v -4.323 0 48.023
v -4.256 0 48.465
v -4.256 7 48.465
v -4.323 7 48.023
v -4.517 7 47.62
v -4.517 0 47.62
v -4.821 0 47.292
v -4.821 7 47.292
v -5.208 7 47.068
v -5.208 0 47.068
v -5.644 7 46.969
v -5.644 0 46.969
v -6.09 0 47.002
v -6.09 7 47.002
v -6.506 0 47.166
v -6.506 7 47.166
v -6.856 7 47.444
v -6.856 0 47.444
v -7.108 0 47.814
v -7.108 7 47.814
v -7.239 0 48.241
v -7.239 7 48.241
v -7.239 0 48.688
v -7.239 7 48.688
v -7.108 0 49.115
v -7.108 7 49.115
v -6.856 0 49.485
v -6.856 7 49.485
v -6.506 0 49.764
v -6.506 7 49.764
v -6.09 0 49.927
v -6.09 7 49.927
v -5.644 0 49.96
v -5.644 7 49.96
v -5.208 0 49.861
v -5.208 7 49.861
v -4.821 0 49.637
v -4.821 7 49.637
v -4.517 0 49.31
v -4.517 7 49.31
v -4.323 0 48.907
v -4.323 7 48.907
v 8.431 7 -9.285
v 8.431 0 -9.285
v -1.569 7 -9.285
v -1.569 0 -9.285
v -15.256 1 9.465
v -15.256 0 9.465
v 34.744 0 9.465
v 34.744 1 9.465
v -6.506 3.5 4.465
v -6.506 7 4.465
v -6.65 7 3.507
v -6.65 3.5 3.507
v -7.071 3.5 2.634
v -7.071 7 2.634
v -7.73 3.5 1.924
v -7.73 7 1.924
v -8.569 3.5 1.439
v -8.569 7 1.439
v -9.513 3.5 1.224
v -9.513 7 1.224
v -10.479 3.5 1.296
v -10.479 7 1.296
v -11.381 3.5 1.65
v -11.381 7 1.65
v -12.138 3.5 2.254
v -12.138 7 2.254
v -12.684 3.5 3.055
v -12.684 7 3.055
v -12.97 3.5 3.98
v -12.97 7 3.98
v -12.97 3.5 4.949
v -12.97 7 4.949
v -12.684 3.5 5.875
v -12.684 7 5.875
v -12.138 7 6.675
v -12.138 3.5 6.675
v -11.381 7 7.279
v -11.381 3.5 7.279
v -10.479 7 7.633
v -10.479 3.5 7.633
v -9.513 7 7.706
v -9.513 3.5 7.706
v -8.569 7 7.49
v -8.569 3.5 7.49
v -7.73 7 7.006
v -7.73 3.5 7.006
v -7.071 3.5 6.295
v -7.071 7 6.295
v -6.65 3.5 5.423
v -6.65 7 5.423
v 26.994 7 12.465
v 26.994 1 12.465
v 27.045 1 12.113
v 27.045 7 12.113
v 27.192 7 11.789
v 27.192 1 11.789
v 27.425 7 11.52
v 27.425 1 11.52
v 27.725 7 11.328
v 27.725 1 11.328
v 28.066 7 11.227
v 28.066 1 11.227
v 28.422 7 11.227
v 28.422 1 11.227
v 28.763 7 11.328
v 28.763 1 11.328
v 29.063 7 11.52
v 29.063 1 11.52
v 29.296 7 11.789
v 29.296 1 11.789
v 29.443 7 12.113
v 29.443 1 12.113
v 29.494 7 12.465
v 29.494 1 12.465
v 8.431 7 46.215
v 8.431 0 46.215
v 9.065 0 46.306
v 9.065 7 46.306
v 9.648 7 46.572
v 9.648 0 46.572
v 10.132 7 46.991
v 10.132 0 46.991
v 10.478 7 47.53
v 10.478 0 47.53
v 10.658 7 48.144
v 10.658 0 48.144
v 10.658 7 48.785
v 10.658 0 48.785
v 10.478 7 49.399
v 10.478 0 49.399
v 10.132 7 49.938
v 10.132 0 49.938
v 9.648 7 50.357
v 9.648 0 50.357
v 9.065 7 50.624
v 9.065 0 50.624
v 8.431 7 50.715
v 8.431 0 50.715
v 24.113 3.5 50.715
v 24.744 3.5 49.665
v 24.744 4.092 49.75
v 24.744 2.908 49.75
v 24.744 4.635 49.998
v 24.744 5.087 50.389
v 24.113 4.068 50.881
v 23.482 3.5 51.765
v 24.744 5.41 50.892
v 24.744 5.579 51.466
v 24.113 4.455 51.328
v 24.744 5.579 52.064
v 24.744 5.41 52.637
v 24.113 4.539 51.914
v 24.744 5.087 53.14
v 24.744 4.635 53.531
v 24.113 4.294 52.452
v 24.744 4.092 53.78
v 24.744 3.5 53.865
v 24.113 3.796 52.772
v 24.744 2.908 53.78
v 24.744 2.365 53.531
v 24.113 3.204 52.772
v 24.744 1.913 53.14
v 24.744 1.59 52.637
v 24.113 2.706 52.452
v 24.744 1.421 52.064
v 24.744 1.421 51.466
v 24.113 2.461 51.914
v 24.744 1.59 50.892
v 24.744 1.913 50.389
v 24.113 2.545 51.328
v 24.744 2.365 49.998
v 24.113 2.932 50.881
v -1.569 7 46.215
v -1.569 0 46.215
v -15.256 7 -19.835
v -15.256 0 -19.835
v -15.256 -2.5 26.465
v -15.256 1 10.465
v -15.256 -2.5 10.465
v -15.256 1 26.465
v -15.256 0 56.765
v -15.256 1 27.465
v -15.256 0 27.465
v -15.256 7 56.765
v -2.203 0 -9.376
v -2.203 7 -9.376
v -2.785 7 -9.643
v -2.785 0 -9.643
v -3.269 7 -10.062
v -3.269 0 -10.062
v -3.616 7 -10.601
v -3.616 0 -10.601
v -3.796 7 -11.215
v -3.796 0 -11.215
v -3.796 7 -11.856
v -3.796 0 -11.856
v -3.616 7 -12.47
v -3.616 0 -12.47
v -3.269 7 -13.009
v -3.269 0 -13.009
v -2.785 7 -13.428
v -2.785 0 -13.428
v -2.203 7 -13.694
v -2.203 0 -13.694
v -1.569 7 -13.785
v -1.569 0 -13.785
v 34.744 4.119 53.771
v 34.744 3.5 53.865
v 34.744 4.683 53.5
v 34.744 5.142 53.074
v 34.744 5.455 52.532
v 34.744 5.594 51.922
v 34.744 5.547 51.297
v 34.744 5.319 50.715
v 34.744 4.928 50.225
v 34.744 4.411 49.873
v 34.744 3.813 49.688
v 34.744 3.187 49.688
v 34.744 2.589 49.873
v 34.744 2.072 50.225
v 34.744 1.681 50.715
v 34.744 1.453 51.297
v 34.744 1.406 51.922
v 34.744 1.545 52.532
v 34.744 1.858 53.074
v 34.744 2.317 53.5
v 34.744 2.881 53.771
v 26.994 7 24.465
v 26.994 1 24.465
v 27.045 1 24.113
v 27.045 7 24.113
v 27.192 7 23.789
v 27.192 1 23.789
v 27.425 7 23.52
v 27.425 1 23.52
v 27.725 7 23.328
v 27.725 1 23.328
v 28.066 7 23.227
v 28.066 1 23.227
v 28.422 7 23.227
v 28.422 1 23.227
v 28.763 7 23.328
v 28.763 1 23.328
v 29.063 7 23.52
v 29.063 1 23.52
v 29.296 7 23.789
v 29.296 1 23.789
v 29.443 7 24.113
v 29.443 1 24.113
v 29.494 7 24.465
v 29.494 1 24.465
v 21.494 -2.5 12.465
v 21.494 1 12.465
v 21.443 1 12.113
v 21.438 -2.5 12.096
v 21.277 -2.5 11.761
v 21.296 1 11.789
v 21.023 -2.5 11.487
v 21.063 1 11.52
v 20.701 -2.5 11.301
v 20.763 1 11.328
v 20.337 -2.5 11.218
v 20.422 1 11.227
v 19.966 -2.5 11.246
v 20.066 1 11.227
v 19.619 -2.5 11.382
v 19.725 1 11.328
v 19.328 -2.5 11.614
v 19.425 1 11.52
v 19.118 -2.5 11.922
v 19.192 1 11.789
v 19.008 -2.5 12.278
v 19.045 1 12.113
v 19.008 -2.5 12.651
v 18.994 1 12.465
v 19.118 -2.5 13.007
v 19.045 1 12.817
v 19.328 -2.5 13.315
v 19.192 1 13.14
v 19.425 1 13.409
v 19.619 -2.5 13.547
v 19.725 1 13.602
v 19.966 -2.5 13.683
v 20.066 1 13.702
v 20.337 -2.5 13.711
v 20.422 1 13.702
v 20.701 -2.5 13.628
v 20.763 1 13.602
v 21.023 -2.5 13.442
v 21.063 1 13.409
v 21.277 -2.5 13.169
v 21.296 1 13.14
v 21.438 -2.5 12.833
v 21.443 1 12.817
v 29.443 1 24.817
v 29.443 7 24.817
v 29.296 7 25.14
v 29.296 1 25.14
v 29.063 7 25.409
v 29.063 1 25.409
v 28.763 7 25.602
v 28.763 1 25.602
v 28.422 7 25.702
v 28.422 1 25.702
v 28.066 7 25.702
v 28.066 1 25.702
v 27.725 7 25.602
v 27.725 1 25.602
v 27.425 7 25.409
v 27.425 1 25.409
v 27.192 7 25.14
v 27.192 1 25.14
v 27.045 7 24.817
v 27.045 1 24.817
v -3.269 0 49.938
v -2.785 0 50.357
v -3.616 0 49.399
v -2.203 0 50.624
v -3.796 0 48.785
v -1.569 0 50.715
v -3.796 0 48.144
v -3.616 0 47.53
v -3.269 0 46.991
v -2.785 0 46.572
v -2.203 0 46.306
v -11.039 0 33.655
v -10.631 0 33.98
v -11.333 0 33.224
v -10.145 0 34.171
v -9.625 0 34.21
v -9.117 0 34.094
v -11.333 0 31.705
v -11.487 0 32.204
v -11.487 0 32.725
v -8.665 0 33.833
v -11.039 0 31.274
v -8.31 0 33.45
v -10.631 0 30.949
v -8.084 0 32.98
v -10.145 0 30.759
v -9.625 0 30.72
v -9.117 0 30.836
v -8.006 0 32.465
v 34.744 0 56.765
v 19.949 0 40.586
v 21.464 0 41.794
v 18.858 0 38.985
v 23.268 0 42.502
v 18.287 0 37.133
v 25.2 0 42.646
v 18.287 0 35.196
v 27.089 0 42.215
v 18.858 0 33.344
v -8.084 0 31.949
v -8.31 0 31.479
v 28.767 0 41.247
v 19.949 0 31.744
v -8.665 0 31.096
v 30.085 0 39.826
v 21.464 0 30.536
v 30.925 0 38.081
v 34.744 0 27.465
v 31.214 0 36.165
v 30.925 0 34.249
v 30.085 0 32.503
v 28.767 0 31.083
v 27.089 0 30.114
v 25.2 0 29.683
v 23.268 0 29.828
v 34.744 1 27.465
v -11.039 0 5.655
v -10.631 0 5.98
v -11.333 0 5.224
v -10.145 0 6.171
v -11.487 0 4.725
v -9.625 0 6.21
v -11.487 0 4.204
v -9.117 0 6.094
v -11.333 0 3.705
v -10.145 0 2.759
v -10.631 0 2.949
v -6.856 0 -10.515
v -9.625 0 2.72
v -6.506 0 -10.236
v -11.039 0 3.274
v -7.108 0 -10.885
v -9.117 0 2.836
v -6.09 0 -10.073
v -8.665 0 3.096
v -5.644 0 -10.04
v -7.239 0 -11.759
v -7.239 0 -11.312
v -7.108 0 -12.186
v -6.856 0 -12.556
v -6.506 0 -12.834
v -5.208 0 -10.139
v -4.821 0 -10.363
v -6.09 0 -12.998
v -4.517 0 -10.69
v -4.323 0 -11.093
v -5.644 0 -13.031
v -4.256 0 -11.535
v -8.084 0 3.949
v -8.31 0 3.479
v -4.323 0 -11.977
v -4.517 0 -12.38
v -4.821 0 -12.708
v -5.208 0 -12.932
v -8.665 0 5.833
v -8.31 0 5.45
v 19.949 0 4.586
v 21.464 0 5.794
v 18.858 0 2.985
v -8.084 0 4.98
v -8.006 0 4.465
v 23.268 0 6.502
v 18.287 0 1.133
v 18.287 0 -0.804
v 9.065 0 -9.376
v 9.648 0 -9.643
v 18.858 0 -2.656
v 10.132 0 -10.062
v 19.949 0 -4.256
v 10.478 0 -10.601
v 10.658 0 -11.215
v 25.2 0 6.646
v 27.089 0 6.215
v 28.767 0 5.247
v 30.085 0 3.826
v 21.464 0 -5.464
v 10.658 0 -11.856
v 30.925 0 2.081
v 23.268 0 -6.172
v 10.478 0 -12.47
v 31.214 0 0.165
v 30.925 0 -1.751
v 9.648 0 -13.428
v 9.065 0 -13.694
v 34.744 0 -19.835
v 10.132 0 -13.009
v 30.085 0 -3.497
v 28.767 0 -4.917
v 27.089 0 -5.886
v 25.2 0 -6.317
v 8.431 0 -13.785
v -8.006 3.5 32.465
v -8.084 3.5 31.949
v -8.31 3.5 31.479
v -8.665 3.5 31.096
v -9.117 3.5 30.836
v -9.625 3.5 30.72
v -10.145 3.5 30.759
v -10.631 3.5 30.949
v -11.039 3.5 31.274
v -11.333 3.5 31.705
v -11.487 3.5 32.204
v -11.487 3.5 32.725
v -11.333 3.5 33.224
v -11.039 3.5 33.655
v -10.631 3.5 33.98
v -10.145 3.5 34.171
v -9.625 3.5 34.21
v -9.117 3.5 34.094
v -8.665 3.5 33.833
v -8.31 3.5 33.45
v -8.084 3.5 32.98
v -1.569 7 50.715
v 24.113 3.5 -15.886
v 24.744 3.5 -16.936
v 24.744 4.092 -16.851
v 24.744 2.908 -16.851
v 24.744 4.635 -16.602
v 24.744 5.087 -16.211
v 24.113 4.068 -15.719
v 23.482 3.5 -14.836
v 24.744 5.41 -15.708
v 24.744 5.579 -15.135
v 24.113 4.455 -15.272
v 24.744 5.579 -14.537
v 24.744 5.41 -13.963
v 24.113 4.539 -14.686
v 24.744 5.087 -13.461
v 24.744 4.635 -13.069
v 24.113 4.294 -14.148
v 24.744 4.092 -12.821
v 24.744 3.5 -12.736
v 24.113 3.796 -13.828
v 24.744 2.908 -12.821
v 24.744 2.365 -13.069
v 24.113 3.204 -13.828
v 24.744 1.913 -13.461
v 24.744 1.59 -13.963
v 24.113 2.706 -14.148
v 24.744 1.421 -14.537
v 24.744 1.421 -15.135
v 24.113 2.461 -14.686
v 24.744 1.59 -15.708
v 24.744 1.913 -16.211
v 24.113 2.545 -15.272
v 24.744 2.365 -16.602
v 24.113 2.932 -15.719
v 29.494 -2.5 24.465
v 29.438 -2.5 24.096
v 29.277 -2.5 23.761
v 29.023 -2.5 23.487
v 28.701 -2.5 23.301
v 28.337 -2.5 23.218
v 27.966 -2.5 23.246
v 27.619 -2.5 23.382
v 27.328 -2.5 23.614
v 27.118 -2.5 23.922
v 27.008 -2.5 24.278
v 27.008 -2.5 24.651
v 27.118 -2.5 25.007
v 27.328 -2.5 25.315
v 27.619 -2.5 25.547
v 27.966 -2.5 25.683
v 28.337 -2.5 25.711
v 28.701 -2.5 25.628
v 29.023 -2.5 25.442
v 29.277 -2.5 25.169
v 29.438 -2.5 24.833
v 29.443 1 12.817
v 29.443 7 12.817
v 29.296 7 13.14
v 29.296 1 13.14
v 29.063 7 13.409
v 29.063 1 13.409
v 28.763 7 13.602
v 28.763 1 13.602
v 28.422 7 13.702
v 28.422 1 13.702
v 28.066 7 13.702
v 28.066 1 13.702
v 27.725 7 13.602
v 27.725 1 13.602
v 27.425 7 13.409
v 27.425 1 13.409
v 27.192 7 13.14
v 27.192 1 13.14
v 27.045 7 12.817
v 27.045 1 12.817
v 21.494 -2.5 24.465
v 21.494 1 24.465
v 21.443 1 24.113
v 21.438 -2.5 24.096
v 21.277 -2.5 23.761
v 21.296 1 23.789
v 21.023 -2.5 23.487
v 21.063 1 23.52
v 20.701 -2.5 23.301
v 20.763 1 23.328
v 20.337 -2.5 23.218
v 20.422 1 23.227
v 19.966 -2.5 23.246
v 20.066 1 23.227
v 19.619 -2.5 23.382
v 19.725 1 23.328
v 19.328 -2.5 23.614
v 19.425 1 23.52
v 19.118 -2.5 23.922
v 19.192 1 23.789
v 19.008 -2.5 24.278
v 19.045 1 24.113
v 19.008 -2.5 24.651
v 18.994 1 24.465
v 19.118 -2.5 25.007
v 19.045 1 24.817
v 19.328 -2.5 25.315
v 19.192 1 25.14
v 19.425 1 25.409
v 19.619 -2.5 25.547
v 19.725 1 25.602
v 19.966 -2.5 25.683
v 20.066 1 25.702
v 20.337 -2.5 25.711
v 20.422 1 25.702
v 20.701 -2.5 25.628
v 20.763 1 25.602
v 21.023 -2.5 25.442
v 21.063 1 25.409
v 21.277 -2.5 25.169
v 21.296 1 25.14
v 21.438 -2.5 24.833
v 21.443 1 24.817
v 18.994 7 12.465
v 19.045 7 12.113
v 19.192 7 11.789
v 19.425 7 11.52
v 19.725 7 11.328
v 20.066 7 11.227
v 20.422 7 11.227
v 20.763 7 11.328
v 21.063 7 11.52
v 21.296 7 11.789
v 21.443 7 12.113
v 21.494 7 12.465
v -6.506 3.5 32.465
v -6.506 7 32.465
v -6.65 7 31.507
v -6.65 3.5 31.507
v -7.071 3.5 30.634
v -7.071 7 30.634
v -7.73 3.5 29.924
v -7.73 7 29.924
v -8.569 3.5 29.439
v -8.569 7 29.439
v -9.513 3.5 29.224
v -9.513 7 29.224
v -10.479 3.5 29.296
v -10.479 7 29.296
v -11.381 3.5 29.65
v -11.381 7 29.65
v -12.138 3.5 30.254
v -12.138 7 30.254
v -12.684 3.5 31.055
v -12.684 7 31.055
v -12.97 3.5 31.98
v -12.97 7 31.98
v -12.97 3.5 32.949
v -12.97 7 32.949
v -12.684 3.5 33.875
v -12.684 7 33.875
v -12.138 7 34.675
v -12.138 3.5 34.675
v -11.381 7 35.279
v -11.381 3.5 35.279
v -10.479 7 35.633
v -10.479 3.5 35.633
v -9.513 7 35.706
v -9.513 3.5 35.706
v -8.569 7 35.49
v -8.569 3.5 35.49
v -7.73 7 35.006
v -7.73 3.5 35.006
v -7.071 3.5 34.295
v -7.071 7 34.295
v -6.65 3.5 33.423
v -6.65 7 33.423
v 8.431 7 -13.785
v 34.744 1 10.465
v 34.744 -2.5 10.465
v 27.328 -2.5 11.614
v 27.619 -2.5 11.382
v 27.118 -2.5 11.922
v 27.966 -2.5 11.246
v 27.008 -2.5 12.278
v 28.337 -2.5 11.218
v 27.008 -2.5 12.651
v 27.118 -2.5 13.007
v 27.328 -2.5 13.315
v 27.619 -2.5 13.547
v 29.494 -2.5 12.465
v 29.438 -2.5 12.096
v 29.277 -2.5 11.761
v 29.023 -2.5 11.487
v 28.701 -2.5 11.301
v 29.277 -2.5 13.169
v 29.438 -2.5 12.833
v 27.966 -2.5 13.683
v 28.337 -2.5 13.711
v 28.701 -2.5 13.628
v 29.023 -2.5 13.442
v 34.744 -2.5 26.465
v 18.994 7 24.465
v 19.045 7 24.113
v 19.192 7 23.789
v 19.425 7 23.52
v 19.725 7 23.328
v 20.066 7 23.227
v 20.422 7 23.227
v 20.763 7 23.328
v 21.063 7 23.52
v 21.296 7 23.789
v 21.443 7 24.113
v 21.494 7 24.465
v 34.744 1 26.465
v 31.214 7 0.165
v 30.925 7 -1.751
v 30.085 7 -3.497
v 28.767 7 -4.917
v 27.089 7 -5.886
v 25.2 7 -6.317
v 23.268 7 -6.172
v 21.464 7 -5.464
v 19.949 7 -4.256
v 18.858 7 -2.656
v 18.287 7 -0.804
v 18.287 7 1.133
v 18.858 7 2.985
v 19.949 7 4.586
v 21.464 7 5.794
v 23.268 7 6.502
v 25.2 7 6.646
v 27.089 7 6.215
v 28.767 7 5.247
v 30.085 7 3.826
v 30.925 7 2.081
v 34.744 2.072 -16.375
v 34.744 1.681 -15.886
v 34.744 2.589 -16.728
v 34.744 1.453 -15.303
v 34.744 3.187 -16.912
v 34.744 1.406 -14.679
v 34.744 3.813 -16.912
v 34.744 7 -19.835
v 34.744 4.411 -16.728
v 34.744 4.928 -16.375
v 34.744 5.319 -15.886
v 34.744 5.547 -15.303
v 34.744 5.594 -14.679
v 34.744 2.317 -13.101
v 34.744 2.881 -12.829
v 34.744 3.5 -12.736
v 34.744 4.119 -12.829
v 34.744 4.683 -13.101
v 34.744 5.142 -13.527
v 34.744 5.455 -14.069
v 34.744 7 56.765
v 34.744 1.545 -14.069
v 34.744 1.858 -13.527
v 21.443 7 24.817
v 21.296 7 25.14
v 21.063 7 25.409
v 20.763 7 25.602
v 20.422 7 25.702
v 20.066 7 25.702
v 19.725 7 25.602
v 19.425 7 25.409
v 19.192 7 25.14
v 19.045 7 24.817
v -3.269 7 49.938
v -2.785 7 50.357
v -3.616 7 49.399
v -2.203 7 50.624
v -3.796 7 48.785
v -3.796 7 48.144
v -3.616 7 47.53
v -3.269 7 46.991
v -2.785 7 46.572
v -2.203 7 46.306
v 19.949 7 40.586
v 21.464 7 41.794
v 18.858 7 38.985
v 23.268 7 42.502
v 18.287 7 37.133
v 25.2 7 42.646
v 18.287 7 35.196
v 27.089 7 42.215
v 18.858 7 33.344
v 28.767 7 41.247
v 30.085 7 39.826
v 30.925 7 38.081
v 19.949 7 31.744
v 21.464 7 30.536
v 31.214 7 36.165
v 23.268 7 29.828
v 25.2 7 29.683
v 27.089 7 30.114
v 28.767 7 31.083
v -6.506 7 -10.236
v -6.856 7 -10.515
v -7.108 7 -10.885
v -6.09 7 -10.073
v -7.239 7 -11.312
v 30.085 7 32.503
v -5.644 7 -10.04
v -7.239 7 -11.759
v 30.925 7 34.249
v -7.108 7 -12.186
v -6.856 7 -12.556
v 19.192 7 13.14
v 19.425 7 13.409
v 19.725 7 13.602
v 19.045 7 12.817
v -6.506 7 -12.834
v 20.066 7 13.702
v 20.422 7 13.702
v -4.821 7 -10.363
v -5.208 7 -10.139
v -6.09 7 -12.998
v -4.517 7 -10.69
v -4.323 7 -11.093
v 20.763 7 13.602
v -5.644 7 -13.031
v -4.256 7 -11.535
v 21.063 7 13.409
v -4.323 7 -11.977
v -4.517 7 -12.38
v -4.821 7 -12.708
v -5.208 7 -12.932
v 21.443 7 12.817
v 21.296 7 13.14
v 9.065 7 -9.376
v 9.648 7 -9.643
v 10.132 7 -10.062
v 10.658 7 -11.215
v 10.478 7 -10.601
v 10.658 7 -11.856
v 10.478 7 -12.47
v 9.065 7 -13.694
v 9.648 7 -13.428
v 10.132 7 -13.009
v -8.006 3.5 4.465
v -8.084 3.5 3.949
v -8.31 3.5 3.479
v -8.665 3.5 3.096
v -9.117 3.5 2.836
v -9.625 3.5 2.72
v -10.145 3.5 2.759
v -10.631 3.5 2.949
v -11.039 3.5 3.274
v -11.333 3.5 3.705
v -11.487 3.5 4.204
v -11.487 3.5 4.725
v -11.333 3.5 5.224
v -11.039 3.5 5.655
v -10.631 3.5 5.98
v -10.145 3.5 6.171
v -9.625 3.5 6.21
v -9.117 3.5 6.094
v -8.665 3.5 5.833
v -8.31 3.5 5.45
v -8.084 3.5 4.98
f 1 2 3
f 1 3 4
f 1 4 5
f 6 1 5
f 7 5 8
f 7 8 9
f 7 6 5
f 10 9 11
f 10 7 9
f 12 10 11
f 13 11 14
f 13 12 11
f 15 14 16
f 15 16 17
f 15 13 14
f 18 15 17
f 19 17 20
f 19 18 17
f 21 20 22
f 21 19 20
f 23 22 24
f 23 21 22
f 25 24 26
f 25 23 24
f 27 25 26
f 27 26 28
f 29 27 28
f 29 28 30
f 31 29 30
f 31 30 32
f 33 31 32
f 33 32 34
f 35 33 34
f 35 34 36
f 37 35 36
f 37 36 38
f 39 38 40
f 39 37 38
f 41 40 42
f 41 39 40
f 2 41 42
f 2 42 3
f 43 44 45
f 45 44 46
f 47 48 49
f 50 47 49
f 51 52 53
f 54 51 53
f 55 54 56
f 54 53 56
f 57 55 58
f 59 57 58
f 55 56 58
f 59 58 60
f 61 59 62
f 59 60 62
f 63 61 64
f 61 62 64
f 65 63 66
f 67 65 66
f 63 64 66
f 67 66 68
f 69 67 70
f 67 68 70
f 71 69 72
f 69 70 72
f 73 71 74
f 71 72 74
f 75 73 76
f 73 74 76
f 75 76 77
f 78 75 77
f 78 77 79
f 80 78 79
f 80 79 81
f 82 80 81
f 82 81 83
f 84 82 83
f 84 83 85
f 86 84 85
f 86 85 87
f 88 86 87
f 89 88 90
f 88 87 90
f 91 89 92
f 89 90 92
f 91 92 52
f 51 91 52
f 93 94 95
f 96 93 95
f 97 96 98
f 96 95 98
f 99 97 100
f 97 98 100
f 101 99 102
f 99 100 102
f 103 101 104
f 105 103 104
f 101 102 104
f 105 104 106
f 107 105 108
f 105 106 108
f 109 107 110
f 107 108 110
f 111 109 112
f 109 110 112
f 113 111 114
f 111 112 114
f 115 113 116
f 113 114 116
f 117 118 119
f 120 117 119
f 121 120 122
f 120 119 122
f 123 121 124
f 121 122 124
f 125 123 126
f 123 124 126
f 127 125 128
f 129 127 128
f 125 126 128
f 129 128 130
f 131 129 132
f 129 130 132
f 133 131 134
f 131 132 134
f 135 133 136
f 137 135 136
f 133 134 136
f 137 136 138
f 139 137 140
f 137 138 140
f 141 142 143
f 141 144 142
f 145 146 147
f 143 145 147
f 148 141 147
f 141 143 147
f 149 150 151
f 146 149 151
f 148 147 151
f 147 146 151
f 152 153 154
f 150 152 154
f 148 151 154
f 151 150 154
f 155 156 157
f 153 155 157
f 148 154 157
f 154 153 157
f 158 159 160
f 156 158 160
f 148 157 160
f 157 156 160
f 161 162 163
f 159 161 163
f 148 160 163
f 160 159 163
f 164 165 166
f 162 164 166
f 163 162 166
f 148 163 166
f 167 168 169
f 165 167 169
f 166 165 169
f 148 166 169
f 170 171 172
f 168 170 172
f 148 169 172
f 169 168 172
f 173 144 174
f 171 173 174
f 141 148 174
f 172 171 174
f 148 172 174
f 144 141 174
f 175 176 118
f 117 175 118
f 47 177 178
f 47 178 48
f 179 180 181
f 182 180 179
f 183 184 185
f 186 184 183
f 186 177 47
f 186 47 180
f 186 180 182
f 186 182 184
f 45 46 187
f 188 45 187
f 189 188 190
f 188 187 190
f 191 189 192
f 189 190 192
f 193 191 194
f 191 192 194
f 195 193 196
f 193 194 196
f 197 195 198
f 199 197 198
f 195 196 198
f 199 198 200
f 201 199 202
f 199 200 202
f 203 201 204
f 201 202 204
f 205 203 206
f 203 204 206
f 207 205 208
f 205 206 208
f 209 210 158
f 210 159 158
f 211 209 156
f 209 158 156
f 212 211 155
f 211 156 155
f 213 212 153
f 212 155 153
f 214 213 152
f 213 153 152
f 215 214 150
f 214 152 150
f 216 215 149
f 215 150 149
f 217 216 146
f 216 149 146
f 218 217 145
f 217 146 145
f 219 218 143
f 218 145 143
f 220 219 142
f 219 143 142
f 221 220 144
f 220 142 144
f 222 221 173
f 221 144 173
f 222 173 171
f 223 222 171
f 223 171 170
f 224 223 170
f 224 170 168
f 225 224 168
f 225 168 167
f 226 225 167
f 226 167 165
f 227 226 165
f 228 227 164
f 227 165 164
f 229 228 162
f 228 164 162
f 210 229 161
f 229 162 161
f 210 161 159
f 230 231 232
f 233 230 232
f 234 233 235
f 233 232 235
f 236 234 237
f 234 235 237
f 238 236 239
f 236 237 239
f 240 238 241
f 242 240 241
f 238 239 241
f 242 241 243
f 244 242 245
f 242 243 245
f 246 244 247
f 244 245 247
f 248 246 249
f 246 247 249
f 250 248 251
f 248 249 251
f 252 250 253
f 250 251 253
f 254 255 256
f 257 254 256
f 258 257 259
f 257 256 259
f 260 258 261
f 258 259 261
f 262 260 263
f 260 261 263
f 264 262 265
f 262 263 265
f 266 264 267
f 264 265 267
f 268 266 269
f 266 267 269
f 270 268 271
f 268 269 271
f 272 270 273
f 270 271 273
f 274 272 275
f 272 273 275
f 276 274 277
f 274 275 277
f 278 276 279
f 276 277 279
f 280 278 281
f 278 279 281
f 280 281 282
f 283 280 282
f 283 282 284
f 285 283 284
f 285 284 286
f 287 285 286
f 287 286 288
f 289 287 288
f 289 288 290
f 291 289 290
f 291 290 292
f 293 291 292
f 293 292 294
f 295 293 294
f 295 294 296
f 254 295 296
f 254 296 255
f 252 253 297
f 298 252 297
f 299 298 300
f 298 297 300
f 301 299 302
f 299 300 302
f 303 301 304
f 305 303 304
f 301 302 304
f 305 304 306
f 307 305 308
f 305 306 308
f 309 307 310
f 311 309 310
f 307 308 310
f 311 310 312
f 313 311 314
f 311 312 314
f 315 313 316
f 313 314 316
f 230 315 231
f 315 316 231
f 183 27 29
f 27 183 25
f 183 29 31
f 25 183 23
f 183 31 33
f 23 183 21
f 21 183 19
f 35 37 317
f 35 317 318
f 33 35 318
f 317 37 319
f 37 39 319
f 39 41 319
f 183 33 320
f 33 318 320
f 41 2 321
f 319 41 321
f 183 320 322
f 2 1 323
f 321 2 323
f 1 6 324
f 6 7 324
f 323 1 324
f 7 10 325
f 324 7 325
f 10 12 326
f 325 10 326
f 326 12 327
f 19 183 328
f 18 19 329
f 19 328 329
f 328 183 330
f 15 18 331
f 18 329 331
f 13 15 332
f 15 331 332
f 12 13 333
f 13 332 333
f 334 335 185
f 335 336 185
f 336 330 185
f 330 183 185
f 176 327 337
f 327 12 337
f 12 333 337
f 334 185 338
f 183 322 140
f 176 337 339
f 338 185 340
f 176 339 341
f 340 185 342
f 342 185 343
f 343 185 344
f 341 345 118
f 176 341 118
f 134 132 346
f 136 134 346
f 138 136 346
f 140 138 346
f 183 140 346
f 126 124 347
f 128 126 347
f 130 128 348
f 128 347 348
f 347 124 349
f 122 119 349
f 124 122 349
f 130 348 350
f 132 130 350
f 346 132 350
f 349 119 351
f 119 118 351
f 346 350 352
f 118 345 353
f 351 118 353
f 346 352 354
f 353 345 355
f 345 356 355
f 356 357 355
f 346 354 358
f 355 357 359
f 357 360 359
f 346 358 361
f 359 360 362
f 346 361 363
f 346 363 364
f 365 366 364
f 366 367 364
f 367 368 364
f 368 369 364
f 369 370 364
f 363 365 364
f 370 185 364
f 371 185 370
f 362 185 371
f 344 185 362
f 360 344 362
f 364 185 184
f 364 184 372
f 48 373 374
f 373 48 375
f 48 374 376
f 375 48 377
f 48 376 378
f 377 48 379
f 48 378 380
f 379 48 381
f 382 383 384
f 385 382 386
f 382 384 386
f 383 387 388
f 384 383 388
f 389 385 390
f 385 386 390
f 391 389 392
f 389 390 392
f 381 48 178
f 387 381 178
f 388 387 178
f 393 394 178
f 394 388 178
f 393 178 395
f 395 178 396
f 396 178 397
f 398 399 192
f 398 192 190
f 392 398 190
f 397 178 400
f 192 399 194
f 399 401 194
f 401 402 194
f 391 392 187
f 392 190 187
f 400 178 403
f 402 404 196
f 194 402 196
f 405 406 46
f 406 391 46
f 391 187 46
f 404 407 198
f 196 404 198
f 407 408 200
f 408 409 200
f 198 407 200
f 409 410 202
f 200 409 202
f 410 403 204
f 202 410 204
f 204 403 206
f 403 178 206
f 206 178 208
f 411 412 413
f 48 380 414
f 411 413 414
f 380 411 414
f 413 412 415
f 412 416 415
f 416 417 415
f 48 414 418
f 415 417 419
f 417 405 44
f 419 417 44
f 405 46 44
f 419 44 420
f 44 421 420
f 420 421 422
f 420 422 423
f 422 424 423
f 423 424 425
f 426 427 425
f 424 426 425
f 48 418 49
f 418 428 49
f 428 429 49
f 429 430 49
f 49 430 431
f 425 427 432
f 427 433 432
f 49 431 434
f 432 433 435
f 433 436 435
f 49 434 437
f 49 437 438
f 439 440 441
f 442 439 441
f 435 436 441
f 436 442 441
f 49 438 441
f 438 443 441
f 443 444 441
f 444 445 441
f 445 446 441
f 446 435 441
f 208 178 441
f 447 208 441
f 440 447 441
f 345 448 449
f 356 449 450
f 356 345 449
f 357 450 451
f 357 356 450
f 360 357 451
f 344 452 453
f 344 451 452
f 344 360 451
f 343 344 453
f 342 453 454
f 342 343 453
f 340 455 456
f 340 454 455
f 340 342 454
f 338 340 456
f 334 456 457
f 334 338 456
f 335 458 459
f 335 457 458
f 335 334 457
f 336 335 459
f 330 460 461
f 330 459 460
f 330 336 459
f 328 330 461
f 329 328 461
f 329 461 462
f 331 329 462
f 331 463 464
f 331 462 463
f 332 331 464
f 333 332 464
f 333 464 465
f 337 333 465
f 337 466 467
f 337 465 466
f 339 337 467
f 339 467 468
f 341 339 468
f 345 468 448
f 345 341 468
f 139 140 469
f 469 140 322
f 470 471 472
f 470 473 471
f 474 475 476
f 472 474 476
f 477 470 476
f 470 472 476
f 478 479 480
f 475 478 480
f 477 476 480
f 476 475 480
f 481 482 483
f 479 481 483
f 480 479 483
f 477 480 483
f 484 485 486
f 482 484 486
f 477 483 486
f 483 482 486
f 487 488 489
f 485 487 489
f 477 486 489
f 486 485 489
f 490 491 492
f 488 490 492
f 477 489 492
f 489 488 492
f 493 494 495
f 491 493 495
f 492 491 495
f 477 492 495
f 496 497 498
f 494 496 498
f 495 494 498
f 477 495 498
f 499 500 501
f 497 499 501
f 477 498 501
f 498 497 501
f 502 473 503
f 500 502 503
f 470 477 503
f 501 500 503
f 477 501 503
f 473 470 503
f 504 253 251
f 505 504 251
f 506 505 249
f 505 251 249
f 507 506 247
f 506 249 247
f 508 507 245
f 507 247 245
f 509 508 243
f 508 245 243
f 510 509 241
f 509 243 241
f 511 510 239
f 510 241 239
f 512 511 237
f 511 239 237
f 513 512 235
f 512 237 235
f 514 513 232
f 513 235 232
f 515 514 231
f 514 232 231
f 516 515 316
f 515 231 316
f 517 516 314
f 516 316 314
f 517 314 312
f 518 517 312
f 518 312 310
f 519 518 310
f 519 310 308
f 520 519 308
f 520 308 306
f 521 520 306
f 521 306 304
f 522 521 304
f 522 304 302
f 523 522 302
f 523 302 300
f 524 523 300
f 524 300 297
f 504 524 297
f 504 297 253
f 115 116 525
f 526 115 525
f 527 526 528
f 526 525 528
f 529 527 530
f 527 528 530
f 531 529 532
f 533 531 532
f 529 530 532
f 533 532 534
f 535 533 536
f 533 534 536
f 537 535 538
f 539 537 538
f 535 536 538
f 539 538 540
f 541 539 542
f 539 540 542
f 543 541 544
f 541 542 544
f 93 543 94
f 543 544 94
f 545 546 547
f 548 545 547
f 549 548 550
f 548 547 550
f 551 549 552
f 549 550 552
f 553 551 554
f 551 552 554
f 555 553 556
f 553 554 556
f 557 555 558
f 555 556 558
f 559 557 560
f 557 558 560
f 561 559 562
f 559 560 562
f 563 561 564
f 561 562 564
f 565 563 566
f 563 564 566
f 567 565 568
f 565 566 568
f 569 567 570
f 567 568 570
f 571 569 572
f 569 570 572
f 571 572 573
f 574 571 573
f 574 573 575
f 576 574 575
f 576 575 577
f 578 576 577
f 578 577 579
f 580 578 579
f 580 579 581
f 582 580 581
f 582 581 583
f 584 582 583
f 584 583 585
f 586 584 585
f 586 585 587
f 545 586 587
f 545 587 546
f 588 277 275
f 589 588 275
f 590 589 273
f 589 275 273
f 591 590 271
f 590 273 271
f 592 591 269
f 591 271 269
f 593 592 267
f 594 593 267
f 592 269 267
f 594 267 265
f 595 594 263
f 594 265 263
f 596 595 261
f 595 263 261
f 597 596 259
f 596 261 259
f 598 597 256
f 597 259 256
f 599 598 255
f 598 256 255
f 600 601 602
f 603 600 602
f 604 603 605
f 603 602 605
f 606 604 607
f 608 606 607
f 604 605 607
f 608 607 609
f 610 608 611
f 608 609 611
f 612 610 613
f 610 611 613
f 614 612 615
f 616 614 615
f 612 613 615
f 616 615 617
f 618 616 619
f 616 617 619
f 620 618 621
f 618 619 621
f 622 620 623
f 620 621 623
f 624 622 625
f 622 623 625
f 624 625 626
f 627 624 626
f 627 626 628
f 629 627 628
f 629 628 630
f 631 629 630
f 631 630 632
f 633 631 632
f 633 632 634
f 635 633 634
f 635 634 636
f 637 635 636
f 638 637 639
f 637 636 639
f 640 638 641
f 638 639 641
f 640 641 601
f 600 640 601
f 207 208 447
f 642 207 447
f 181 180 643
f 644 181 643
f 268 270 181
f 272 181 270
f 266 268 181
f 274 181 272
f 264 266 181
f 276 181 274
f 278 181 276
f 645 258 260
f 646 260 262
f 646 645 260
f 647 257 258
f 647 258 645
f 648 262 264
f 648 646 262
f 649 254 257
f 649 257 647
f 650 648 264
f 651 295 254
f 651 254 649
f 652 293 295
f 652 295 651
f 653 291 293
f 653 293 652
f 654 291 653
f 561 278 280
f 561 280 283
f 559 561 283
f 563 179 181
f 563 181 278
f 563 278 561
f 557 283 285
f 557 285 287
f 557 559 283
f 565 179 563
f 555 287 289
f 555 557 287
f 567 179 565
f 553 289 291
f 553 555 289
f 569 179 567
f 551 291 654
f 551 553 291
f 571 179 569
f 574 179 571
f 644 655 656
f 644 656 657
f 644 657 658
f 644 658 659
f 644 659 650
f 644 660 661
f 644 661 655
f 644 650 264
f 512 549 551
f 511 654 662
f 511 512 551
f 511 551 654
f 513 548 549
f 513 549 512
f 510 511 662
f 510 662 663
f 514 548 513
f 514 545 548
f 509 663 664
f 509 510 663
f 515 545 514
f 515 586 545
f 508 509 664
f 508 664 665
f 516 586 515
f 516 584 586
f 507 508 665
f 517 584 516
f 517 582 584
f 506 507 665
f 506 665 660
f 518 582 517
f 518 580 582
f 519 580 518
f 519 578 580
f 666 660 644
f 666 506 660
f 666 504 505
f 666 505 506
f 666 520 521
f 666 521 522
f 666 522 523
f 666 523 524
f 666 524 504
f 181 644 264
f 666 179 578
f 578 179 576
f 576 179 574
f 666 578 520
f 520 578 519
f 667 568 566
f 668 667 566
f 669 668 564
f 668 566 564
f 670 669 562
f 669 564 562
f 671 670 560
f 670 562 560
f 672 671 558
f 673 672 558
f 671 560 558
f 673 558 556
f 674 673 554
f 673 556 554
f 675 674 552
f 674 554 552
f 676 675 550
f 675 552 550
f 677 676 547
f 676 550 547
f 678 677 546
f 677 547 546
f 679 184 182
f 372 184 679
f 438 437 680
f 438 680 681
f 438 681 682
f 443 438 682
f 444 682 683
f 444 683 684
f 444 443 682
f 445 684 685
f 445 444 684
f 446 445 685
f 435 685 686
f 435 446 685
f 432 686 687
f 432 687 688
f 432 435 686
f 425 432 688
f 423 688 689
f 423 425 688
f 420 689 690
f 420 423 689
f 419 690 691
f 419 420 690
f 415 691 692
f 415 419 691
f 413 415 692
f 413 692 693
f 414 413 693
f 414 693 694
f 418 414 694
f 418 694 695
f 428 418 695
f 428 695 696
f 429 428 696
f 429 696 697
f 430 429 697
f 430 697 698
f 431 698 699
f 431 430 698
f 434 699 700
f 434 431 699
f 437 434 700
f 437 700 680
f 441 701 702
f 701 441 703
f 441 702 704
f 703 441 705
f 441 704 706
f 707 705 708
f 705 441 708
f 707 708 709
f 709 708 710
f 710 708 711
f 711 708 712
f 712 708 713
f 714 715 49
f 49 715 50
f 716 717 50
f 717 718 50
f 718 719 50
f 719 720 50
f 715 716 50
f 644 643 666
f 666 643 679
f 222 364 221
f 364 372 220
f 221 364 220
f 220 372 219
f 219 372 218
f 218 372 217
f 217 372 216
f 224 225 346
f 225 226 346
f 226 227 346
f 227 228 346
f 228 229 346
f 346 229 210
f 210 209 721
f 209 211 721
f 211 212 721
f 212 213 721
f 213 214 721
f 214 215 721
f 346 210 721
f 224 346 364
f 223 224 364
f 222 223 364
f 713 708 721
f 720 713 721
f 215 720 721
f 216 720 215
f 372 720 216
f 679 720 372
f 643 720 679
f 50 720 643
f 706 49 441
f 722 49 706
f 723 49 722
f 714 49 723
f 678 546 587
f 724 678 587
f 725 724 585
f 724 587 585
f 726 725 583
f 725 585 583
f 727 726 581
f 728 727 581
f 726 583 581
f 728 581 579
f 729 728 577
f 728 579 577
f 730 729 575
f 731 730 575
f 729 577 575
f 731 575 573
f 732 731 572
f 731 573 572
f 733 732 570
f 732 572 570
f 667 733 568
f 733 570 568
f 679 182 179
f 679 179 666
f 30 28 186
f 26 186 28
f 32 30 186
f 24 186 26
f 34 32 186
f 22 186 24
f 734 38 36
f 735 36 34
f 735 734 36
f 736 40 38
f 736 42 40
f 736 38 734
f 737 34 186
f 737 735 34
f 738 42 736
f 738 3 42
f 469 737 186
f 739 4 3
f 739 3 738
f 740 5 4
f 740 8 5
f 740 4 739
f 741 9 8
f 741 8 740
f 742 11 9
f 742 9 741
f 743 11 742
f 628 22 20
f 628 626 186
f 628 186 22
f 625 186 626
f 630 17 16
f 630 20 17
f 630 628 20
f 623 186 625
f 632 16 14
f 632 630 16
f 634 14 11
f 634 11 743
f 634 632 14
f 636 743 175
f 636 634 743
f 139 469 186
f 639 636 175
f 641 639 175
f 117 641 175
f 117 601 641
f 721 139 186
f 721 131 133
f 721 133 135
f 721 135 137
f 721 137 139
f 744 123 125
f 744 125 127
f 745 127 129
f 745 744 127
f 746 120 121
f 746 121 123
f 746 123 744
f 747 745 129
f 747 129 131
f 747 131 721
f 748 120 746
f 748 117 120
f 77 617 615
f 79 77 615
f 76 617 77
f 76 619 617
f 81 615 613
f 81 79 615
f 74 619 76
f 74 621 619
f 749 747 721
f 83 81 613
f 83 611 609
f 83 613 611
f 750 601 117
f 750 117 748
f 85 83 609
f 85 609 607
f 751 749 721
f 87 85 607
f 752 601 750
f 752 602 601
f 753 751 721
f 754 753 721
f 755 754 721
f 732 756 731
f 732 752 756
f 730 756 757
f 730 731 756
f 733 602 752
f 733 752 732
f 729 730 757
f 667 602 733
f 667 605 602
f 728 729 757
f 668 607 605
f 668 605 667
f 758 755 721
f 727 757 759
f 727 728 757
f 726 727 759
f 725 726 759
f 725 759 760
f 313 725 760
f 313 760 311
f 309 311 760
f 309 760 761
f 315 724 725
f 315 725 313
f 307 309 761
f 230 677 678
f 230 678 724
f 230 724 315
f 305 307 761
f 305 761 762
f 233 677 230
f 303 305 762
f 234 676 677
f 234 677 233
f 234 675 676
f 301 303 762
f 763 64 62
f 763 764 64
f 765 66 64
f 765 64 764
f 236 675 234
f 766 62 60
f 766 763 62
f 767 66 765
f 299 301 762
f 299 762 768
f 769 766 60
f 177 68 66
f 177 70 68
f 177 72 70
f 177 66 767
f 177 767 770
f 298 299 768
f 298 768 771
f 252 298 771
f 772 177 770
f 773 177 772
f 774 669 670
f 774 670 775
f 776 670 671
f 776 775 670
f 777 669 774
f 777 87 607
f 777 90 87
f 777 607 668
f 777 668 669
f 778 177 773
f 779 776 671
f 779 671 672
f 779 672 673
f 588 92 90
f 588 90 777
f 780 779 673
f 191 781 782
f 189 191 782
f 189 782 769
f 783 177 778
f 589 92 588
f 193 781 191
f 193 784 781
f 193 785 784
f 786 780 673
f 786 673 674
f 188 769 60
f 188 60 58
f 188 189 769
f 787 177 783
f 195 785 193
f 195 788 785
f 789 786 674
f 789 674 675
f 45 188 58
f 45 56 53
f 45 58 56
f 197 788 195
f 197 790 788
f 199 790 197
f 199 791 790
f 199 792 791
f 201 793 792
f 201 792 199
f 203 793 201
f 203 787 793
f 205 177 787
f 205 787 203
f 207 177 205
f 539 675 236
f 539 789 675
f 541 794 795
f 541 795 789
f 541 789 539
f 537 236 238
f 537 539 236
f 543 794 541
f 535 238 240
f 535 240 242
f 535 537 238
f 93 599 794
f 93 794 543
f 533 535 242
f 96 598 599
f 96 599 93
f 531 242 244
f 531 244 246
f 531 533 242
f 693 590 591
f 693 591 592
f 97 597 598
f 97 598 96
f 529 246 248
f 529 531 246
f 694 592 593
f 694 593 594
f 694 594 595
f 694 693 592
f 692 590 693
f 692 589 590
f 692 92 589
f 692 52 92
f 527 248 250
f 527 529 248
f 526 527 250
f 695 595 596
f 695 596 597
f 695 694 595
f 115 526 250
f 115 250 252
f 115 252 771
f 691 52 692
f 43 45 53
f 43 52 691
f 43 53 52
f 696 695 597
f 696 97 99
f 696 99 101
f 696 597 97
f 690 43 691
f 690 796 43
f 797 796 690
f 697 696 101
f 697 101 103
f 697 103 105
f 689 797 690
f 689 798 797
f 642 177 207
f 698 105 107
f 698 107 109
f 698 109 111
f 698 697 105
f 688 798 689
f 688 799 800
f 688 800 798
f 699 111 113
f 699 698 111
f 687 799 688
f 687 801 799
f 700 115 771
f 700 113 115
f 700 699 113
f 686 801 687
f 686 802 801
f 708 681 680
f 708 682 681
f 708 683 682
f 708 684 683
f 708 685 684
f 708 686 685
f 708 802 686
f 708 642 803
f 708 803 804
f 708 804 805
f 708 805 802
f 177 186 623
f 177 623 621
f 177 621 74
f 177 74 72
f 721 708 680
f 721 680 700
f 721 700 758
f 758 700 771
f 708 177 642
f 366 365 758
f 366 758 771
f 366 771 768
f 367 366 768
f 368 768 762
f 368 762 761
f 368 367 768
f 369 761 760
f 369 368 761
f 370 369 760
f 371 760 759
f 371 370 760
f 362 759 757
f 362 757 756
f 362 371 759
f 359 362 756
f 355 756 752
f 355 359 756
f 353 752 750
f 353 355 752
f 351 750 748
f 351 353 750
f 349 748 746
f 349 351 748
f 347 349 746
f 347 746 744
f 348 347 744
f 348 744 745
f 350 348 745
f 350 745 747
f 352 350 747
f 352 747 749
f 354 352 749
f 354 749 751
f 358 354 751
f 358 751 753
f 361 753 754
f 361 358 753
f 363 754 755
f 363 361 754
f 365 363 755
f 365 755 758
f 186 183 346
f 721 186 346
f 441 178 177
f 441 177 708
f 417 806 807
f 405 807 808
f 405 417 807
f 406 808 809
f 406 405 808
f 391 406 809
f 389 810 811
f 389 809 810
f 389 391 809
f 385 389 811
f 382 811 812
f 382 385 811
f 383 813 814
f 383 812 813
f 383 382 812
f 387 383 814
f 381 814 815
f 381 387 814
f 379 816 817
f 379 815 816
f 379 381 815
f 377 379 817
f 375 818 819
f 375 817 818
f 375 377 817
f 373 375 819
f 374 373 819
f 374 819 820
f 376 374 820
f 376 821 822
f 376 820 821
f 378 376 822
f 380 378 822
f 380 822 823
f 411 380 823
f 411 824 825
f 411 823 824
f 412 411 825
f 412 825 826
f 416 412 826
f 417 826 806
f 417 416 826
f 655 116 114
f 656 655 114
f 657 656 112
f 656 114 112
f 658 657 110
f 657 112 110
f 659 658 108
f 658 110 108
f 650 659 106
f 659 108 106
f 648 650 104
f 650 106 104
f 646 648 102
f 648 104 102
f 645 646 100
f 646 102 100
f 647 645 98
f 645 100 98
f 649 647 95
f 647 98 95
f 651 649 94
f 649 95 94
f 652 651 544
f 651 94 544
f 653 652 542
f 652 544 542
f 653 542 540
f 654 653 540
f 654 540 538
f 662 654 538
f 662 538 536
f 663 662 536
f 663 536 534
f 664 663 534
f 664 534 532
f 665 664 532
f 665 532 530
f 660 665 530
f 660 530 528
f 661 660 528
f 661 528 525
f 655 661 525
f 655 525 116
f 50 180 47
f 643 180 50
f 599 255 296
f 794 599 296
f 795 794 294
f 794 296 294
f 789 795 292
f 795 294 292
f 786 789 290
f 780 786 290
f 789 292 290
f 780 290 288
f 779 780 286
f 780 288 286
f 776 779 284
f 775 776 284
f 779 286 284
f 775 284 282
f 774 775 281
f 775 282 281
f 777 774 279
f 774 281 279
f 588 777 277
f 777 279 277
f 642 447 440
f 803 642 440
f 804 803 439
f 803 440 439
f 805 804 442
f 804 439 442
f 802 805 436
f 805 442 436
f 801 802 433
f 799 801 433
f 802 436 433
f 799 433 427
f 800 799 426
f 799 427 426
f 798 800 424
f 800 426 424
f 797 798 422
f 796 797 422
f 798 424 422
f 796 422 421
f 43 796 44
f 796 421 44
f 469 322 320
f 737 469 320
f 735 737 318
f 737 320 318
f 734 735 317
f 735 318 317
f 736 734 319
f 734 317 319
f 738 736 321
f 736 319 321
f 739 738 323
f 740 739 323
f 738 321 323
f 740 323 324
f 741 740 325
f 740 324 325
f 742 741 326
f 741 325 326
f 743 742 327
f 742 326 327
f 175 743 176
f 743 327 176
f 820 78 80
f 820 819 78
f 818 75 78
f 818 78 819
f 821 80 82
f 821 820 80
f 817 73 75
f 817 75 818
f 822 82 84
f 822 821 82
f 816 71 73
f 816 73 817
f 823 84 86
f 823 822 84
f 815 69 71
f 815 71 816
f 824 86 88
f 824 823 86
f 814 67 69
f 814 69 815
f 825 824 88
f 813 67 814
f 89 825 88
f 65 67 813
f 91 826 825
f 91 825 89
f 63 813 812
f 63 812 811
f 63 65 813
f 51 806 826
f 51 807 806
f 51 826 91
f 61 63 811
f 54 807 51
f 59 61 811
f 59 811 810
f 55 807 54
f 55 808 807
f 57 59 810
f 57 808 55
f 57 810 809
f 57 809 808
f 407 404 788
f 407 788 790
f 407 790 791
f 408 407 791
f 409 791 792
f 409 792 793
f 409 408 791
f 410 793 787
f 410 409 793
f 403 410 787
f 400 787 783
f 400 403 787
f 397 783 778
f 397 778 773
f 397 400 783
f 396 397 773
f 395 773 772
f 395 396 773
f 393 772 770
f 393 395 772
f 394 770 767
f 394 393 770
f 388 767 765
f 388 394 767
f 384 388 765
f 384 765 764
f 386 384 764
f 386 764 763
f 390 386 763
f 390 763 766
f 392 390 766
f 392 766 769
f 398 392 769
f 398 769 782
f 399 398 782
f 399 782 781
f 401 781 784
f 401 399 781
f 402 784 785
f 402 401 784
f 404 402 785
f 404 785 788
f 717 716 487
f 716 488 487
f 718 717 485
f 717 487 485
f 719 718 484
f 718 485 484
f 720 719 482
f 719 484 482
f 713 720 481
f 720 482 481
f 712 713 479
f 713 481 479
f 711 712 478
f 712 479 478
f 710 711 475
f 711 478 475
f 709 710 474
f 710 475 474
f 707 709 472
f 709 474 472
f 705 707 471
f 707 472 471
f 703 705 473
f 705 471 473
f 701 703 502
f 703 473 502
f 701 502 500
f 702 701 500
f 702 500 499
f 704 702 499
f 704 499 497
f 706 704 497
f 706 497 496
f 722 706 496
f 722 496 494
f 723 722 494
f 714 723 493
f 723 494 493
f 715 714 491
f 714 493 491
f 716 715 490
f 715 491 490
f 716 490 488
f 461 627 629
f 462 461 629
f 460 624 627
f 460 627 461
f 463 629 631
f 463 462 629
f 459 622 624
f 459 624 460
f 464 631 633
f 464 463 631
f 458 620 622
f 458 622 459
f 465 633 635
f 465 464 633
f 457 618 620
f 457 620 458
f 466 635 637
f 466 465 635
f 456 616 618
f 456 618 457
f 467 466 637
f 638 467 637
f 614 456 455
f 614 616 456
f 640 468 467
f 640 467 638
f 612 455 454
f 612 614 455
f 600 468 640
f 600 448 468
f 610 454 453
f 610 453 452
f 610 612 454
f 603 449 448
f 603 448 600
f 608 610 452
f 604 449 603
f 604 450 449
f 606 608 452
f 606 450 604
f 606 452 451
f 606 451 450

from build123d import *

# Parameters (mm, degrees)
SKETCH1_W             = 50
SKETCH1_H             = 76.6
SKETCH1_R             = 6.5
SKETCH1_R_2           = 1.75
SKETCH1_R_3           = 1.5
BOSS_EXTRUDE1_DEPTH   = 7
M5_TAPPED_HOLE1_D     = 4.2
M5_TAPPED_HOLE1_DEPTH = 10
M5_TAPPED_HOLE1_TIP   = 1.2618073
SKETCH4_R             = 3.25
CUT_EXTRUDE1_DEPTH    = 3.5
M3_TAPPED_HOLE1_D     = 2.5
M3_TAPPED_HOLE1_DEPTH = 20
M3_TAPPED_HOLE1_TIP   = 0.751075774
SKETCH10_W            = 50
SKETCH10_H            = 18
CUT_EXTRUDE3_DEPTH    = 1
SKETCH11_W            = 50
SKETCH11_H            = 16
BOSS_EXTRUDE2_DEPTH   = 3.5
M3_TAPPED_HOLE2_D     = 2.5
M3_TAPPED_HOLE2_DEPTH = 20
M3_TAPPED_HOLE2_TIP   = 0.751075774


with BuildPart() as part:
    # Sketch1 → Boss-Extrude1 (new body)
    with BuildSketch(Plane(origin=(0, 0, 0), x_dir=(1, 0, 0), z_dir=(0, 1, 0))):
        with Locations((9.743944876, -18.464670659)):
            Rectangle(SKETCH1_W, SKETCH1_H)
        with Locations((24.714004756, -0.164670659)):
            Circle(SKETCH1_R, mode=Mode.SUBTRACT)
        with Locations((24.714004756, -36.164670659)):
            Circle(SKETCH1_R, mode=Mode.SUBTRACT)
        with Locations((-9.756055124, -4.464670659)):
            Circle(SKETCH1_R_2, mode=Mode.SUBTRACT)
        with Locations((-9.756055124, -32.464670659)):
            Circle(SKETCH1_R_2, mode=Mode.SUBTRACT)
        with Locations((-5.756055124, -48.464670659)):
            Circle(SKETCH1_R_3, mode=Mode.SUBTRACT)
        with Locations((-5.756055124, 11.535329341)):
            Circle(SKETCH1_R_3, mode=Mode.SUBTRACT)
        with BuildLine():
            Line((-1.568862275, 13.785329341), (8.431137725, 13.785329341))
            ThreePointArc((8.431137725, 13.785329341), (10.681137725, 11.535329341), (8.431137725, 9.285329341))
            Line((8.431137725, 9.285329341), (-1.568862275, 9.285329341))
            ThreePointArc((-1.568862275, 9.285329341), (-3.818862275, 11.535329341), (-1.568862275, 13.785329341))
        make_face(mode=Mode.SUBTRACT)
        with BuildLine():
            Line((-1.568862275, -46.214670659), (8.431137725, -46.214670659))
            ThreePointArc((8.431137725, -46.214670659), (10.681137725, -48.464670659), (8.431137725, -50.714670659))
            Line((8.431137725, -50.714670659), (-1.568862275, -50.714670659))
            ThreePointArc((-1.568862275, -50.714670659), (-3.818862275, -48.464670659), (-1.568862275, -46.214670659))
        make_face(mode=Mode.SUBTRACT)
    extrude(amount=BOSS_EXTRUDE1_DEPTH)

    # M5 Tapped Hole1
    with Locations(Plane(origin=(34.743944876, 0, 0), x_dir=(0, 0, -1), z_dir=(1, 0, 0))):
        with Locations((14.835829661, 3.5), (-51.764670659, 3.5)):
            Hole(M5_TAPPED_HOLE1_D / 2, depth=M5_TAPPED_HOLE1_DEPTH)
            with Locations((0, 0, -(M5_TAPPED_HOLE1_DEPTH + M5_TAPPED_HOLE1_TIP / 2))):  # 118° drill point
                Cone(0, M5_TAPPED_HOLE1_D / 2, M5_TAPPED_HOLE1_TIP, mode=Mode.SUBTRACT)

    # Sketch4 → Cut-Extrude1 (cut)
    with BuildSketch(Plane(origin=(0, 7, 0), x_dir=(1, 0, 0), z_dir=(0, 1, 0))):
        with Locations((-9.756055124, -4.464670659)):
            Circle(SKETCH4_R)
        with Locations((-9.756055124, -32.464670659)):
            Circle(SKETCH4_R)
    extrude(amount=-CUT_EXTRUDE1_DEPTH, mode=Mode.SUBTRACT)

    # M3 Tapped Hole1
    with Locations(Plane(origin=(0, 7, 0), x_dir=(1, 0, 0), z_dir=(0, 1, 0))):
        with Locations((20.243944876, -12.464670659), (28.243944876, -12.464670659), (28.243944876, -24.464670659), (20.243944876, -24.464670659)):
            Hole(M3_TAPPED_HOLE1_D / 2, depth=M3_TAPPED_HOLE1_DEPTH)
            with Locations((0, 0, -(M3_TAPPED_HOLE1_DEPTH + M3_TAPPED_HOLE1_TIP / 2))):  # 118° drill point
                Cone(0, M3_TAPPED_HOLE1_D / 2, M3_TAPPED_HOLE1_TIP, mode=Mode.SUBTRACT)

    # Sketch10 → Cut-Extrude3 (cut)
    with BuildSketch(Plane.XZ):
        with Locations((9.743944876, 18.464670659)):
            Rectangle(SKETCH10_W, SKETCH10_H)
    extrude(amount=-CUT_EXTRUDE3_DEPTH, mode=Mode.SUBTRACT)

    # Sketch11 → Boss-Extrude2 (add)
    with BuildSketch(Plane.XZ.offset(-1)):
        with Locations((9.743944876, 18.464670659)):
            Rectangle(SKETCH11_W, SKETCH11_H)
    extrude(amount=BOSS_EXTRUDE2_DEPTH)

    # M3 Tapped Hole2
    with Locations(Plane(origin=(0, -2.5, 0), x_dir=(-1, 0, 0), z_dir=(0, -1, 0))):
        with Locations((-20.243944876, -12.464670659), (-28.243944876, -12.464670659), (-20.243944876, -24.464670659), (-28.243944876, -24.464670659), (-47.068271945, 0)):
            Hole(M3_TAPPED_HOLE2_D / 2, depth=M3_TAPPED_HOLE2_DEPTH)
            with Locations((0, 0, -(M3_TAPPED_HOLE2_DEPTH + M3_TAPPED_HOLE2_TIP / 2))):  # 118° drill point
                Cone(0, M3_TAPPED_HOLE2_D / 2, M3_TAPPED_HOLE2_TIP, mode=Mode.SUBTRACT)


solid = part.part
